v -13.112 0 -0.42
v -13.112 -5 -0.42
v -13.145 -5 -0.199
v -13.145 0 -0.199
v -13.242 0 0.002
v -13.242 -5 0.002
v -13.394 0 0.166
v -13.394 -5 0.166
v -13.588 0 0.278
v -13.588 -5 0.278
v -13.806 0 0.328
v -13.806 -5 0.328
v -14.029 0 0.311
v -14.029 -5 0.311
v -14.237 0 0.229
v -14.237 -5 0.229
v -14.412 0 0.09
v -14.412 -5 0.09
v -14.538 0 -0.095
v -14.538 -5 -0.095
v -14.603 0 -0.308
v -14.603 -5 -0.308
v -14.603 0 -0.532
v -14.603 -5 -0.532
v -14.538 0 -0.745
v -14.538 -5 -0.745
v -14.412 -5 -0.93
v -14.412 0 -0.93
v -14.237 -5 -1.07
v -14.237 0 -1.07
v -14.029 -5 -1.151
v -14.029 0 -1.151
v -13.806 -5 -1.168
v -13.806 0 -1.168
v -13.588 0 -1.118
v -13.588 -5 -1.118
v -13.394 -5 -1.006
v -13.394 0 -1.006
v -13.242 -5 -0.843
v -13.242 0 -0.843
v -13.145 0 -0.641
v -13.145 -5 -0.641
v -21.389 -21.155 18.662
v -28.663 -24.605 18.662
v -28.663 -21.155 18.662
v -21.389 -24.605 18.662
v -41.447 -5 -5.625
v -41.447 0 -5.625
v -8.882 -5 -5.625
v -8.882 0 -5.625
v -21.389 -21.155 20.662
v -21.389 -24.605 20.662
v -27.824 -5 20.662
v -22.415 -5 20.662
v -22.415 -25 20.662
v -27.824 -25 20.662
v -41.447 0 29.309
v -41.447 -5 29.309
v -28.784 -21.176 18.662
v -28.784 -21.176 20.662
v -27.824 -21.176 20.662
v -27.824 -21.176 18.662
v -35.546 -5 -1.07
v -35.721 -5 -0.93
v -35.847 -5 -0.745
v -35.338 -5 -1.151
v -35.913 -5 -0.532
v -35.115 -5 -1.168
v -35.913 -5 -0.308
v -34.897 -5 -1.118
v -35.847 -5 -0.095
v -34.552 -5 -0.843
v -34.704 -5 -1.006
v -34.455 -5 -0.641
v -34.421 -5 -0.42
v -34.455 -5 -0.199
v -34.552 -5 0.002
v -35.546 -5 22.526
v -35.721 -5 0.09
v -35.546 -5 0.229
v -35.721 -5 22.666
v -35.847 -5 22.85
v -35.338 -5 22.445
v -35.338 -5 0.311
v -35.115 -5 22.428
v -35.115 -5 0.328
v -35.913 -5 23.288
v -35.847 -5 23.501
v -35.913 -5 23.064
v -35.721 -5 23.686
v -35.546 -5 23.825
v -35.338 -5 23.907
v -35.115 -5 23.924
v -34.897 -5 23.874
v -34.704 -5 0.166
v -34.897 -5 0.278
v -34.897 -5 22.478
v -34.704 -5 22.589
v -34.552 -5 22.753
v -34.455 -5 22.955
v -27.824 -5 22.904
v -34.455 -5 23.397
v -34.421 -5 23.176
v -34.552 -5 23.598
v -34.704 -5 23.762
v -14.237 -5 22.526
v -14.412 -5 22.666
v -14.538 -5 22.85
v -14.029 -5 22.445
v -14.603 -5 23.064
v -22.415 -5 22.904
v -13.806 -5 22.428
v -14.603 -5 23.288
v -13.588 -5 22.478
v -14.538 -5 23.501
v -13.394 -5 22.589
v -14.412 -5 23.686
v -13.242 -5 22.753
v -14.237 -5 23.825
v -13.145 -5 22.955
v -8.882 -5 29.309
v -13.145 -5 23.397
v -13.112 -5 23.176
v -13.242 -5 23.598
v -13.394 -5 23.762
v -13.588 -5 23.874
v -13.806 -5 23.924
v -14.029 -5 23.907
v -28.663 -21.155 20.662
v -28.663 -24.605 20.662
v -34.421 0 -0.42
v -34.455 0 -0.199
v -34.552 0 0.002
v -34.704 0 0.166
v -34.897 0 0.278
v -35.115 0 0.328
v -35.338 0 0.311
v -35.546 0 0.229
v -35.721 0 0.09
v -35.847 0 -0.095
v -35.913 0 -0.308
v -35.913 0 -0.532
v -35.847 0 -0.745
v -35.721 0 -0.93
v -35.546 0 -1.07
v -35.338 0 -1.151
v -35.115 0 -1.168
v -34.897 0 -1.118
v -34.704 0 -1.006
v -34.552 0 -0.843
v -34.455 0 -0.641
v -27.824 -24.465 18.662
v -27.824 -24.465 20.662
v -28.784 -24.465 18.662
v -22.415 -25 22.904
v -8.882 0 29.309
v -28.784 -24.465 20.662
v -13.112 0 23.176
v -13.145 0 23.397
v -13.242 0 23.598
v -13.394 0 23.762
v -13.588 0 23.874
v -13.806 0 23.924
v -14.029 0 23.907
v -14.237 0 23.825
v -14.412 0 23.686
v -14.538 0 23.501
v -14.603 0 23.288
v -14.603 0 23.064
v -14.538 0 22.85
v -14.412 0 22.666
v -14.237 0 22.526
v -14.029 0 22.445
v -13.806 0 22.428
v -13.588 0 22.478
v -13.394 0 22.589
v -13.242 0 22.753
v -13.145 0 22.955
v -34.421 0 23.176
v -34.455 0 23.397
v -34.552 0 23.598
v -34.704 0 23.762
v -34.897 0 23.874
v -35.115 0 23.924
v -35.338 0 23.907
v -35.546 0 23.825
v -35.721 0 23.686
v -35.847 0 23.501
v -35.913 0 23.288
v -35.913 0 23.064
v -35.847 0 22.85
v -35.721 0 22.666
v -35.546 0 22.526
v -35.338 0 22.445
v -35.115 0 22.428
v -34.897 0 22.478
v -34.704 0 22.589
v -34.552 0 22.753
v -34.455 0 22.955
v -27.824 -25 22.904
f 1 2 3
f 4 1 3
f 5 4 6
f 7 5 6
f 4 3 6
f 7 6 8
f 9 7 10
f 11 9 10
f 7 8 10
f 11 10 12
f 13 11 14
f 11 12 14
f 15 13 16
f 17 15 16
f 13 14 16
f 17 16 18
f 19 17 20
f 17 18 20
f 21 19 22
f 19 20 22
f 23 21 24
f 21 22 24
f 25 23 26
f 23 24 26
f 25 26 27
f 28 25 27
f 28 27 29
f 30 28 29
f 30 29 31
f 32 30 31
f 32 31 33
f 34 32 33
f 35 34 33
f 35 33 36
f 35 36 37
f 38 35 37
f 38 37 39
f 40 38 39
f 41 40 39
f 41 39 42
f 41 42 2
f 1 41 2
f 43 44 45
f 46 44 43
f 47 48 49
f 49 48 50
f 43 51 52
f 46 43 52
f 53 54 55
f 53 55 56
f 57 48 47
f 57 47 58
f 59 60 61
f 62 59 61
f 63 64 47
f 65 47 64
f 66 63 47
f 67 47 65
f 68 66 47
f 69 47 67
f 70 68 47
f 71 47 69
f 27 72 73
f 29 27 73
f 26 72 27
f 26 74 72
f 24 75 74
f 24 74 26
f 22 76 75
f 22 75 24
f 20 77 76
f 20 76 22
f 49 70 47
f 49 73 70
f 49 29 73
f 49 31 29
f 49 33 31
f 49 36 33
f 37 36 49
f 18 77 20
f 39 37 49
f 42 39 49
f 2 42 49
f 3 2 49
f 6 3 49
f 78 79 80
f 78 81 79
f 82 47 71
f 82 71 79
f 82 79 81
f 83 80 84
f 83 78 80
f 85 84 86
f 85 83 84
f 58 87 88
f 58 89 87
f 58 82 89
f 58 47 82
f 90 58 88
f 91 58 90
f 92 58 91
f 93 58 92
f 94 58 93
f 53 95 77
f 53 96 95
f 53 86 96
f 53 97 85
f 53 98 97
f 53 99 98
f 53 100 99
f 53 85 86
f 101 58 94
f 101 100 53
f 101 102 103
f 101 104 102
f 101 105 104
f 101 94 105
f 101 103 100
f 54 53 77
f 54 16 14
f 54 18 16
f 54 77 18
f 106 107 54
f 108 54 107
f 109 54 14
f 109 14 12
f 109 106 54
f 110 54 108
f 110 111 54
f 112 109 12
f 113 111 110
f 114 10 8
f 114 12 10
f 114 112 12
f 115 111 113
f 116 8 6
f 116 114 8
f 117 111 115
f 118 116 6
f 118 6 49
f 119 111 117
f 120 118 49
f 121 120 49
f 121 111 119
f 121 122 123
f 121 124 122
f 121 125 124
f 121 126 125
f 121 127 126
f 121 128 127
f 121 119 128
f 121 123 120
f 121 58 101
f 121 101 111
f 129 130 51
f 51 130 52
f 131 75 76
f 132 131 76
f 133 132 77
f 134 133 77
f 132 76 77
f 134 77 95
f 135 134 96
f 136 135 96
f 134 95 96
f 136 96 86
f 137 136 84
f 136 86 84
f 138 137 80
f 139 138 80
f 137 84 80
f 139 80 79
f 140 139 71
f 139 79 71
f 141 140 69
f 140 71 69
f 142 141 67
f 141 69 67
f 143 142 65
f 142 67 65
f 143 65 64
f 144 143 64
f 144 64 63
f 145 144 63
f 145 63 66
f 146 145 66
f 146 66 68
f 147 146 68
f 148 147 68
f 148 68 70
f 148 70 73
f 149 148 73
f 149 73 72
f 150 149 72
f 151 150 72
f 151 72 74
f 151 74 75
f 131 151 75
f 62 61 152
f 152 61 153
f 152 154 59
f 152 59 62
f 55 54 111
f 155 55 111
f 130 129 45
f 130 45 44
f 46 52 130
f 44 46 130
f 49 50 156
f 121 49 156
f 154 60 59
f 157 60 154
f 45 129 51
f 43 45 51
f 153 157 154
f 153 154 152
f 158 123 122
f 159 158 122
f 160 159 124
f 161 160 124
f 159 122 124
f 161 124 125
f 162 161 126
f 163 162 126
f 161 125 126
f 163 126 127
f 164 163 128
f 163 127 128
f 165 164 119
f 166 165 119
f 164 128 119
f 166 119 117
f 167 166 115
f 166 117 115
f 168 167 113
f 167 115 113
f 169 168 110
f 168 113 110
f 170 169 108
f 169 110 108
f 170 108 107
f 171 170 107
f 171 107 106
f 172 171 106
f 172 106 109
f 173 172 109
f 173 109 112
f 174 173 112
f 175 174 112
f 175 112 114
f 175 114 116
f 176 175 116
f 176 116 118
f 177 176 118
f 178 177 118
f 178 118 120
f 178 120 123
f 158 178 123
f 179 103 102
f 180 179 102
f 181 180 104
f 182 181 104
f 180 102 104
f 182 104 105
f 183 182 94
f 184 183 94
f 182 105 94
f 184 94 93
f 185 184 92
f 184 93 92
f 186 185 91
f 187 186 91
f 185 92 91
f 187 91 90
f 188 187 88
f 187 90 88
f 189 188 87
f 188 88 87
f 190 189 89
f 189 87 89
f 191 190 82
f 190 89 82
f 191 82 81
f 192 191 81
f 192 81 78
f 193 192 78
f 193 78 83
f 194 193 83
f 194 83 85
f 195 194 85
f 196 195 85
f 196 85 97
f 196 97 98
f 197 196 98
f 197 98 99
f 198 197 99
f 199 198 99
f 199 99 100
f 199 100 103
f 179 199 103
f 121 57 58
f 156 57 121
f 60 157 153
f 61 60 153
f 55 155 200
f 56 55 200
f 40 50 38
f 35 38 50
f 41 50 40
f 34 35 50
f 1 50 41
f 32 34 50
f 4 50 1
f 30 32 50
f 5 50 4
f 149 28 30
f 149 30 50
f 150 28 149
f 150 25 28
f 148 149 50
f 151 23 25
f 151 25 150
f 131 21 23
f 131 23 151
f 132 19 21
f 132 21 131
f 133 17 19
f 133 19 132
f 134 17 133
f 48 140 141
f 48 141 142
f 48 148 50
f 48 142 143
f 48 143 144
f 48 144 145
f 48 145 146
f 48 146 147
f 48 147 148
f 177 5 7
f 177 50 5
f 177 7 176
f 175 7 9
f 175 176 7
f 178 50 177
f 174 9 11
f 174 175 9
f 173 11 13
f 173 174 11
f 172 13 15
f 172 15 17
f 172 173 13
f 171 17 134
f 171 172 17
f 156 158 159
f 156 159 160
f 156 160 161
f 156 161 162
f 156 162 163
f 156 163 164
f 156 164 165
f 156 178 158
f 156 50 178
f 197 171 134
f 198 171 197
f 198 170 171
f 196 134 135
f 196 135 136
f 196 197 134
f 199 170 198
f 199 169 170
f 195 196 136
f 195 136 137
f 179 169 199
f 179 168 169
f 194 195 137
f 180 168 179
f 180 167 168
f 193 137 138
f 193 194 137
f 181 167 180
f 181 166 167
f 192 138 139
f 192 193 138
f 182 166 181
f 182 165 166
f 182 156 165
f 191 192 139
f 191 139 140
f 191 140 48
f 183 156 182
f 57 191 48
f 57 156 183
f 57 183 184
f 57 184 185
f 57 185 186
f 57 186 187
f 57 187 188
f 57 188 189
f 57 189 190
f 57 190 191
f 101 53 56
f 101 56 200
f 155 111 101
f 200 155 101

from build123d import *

# Parameters (mm, degrees)
F0_W     = 32.5657911599
F0_H     = 34.9342138506
F1_DEPTH = 5
F2_W     = 5.4085478187
F2_H     = 2.2419001907
F3_DEPTH = 25
F4_W     = 0.9602960199
F4_H     = 3.2896772027
F5_DEPTH = 2
F6_W     = 0.8392520249
F6_H     = 3.4502763301
F6_W_2   = 1.025756821
F6_W_3   = 5.4085478187
F7_DEPTH = 2
F8_R     = 0.75
F9_DEPTH = 25


with BuildPart() as f1:
    # F0 (on Front) → F1 (new body)
    with BuildSketch(Plane.XZ):
        with Locations((-25.1644756645, 11.8421062361)):
            Rectangle(F0_W, F0_H)
    extrude(amount=F1_DEPTH)

    # F2 (on face) → F3 (join)
    with BuildSketch(Plane(origin=(0, 0, 0), x_dir=(-1, 0, 0), z_dir=(0, 1, 0))):
        with Locations((25.1194499433, 21.7826096341)):
            Rectangle(F2_W, F2_H)
    extrude(amount=-F3_DEPTH)

    # F8 (on face) → F9 (cut)
    with BuildSketch(Plane.XZ.offset(5)):
        with Locations((-35.1711931261, 23.1757219534)):
            Circle(F8_R)
        with Locations((-13.8618085725, 23.1757219534)):
            Circle(F8_R)
        with Locations((-13.8618085725, -0.4200767102)):
            Circle(F8_R)
        with Locations((-35.1711931261, -0.4200767102)):
            Circle(F8_R)
    extrude(amount=-F9_DEPTH, mode=Mode.SUBTRACT)


with BuildPart() as f5:
    # F4 (on face) → F5 (new body)
    with BuildSketch(Plane(origin=(0, 0, 20.6616595387), x_dir=(1, 0, 0), z_dir=(0, 0, -1))):
        with Locations((-28.3038718626, 22.8204913437)):
            Rectangle(F4_W, F4_H)
    extrude(amount=F5_DEPTH)


with BuildPart() as f7:
    # F6 (on face) → F7 (new body)
    with BuildSketch(Plane(origin=(0, 0, 20.6616595387), x_dir=(1, 0, 0), z_dir=(0, 0, -1))):
        with Locations((-28.2433498651, 22.8796871379)):
            Rectangle(F6_W, F6_H)
        with Locations((-21.9022976235, 22.8796871379)):
            Rectangle(F6_W_2, F6_H)
        with Locations((-25.1194499433, 22.8796871379)):
            Rectangle(F6_W_3, F6_H)
    extrude(amount=F7_DEPTH)


solid = Compound([f1.part, f5.part, f7.part])
